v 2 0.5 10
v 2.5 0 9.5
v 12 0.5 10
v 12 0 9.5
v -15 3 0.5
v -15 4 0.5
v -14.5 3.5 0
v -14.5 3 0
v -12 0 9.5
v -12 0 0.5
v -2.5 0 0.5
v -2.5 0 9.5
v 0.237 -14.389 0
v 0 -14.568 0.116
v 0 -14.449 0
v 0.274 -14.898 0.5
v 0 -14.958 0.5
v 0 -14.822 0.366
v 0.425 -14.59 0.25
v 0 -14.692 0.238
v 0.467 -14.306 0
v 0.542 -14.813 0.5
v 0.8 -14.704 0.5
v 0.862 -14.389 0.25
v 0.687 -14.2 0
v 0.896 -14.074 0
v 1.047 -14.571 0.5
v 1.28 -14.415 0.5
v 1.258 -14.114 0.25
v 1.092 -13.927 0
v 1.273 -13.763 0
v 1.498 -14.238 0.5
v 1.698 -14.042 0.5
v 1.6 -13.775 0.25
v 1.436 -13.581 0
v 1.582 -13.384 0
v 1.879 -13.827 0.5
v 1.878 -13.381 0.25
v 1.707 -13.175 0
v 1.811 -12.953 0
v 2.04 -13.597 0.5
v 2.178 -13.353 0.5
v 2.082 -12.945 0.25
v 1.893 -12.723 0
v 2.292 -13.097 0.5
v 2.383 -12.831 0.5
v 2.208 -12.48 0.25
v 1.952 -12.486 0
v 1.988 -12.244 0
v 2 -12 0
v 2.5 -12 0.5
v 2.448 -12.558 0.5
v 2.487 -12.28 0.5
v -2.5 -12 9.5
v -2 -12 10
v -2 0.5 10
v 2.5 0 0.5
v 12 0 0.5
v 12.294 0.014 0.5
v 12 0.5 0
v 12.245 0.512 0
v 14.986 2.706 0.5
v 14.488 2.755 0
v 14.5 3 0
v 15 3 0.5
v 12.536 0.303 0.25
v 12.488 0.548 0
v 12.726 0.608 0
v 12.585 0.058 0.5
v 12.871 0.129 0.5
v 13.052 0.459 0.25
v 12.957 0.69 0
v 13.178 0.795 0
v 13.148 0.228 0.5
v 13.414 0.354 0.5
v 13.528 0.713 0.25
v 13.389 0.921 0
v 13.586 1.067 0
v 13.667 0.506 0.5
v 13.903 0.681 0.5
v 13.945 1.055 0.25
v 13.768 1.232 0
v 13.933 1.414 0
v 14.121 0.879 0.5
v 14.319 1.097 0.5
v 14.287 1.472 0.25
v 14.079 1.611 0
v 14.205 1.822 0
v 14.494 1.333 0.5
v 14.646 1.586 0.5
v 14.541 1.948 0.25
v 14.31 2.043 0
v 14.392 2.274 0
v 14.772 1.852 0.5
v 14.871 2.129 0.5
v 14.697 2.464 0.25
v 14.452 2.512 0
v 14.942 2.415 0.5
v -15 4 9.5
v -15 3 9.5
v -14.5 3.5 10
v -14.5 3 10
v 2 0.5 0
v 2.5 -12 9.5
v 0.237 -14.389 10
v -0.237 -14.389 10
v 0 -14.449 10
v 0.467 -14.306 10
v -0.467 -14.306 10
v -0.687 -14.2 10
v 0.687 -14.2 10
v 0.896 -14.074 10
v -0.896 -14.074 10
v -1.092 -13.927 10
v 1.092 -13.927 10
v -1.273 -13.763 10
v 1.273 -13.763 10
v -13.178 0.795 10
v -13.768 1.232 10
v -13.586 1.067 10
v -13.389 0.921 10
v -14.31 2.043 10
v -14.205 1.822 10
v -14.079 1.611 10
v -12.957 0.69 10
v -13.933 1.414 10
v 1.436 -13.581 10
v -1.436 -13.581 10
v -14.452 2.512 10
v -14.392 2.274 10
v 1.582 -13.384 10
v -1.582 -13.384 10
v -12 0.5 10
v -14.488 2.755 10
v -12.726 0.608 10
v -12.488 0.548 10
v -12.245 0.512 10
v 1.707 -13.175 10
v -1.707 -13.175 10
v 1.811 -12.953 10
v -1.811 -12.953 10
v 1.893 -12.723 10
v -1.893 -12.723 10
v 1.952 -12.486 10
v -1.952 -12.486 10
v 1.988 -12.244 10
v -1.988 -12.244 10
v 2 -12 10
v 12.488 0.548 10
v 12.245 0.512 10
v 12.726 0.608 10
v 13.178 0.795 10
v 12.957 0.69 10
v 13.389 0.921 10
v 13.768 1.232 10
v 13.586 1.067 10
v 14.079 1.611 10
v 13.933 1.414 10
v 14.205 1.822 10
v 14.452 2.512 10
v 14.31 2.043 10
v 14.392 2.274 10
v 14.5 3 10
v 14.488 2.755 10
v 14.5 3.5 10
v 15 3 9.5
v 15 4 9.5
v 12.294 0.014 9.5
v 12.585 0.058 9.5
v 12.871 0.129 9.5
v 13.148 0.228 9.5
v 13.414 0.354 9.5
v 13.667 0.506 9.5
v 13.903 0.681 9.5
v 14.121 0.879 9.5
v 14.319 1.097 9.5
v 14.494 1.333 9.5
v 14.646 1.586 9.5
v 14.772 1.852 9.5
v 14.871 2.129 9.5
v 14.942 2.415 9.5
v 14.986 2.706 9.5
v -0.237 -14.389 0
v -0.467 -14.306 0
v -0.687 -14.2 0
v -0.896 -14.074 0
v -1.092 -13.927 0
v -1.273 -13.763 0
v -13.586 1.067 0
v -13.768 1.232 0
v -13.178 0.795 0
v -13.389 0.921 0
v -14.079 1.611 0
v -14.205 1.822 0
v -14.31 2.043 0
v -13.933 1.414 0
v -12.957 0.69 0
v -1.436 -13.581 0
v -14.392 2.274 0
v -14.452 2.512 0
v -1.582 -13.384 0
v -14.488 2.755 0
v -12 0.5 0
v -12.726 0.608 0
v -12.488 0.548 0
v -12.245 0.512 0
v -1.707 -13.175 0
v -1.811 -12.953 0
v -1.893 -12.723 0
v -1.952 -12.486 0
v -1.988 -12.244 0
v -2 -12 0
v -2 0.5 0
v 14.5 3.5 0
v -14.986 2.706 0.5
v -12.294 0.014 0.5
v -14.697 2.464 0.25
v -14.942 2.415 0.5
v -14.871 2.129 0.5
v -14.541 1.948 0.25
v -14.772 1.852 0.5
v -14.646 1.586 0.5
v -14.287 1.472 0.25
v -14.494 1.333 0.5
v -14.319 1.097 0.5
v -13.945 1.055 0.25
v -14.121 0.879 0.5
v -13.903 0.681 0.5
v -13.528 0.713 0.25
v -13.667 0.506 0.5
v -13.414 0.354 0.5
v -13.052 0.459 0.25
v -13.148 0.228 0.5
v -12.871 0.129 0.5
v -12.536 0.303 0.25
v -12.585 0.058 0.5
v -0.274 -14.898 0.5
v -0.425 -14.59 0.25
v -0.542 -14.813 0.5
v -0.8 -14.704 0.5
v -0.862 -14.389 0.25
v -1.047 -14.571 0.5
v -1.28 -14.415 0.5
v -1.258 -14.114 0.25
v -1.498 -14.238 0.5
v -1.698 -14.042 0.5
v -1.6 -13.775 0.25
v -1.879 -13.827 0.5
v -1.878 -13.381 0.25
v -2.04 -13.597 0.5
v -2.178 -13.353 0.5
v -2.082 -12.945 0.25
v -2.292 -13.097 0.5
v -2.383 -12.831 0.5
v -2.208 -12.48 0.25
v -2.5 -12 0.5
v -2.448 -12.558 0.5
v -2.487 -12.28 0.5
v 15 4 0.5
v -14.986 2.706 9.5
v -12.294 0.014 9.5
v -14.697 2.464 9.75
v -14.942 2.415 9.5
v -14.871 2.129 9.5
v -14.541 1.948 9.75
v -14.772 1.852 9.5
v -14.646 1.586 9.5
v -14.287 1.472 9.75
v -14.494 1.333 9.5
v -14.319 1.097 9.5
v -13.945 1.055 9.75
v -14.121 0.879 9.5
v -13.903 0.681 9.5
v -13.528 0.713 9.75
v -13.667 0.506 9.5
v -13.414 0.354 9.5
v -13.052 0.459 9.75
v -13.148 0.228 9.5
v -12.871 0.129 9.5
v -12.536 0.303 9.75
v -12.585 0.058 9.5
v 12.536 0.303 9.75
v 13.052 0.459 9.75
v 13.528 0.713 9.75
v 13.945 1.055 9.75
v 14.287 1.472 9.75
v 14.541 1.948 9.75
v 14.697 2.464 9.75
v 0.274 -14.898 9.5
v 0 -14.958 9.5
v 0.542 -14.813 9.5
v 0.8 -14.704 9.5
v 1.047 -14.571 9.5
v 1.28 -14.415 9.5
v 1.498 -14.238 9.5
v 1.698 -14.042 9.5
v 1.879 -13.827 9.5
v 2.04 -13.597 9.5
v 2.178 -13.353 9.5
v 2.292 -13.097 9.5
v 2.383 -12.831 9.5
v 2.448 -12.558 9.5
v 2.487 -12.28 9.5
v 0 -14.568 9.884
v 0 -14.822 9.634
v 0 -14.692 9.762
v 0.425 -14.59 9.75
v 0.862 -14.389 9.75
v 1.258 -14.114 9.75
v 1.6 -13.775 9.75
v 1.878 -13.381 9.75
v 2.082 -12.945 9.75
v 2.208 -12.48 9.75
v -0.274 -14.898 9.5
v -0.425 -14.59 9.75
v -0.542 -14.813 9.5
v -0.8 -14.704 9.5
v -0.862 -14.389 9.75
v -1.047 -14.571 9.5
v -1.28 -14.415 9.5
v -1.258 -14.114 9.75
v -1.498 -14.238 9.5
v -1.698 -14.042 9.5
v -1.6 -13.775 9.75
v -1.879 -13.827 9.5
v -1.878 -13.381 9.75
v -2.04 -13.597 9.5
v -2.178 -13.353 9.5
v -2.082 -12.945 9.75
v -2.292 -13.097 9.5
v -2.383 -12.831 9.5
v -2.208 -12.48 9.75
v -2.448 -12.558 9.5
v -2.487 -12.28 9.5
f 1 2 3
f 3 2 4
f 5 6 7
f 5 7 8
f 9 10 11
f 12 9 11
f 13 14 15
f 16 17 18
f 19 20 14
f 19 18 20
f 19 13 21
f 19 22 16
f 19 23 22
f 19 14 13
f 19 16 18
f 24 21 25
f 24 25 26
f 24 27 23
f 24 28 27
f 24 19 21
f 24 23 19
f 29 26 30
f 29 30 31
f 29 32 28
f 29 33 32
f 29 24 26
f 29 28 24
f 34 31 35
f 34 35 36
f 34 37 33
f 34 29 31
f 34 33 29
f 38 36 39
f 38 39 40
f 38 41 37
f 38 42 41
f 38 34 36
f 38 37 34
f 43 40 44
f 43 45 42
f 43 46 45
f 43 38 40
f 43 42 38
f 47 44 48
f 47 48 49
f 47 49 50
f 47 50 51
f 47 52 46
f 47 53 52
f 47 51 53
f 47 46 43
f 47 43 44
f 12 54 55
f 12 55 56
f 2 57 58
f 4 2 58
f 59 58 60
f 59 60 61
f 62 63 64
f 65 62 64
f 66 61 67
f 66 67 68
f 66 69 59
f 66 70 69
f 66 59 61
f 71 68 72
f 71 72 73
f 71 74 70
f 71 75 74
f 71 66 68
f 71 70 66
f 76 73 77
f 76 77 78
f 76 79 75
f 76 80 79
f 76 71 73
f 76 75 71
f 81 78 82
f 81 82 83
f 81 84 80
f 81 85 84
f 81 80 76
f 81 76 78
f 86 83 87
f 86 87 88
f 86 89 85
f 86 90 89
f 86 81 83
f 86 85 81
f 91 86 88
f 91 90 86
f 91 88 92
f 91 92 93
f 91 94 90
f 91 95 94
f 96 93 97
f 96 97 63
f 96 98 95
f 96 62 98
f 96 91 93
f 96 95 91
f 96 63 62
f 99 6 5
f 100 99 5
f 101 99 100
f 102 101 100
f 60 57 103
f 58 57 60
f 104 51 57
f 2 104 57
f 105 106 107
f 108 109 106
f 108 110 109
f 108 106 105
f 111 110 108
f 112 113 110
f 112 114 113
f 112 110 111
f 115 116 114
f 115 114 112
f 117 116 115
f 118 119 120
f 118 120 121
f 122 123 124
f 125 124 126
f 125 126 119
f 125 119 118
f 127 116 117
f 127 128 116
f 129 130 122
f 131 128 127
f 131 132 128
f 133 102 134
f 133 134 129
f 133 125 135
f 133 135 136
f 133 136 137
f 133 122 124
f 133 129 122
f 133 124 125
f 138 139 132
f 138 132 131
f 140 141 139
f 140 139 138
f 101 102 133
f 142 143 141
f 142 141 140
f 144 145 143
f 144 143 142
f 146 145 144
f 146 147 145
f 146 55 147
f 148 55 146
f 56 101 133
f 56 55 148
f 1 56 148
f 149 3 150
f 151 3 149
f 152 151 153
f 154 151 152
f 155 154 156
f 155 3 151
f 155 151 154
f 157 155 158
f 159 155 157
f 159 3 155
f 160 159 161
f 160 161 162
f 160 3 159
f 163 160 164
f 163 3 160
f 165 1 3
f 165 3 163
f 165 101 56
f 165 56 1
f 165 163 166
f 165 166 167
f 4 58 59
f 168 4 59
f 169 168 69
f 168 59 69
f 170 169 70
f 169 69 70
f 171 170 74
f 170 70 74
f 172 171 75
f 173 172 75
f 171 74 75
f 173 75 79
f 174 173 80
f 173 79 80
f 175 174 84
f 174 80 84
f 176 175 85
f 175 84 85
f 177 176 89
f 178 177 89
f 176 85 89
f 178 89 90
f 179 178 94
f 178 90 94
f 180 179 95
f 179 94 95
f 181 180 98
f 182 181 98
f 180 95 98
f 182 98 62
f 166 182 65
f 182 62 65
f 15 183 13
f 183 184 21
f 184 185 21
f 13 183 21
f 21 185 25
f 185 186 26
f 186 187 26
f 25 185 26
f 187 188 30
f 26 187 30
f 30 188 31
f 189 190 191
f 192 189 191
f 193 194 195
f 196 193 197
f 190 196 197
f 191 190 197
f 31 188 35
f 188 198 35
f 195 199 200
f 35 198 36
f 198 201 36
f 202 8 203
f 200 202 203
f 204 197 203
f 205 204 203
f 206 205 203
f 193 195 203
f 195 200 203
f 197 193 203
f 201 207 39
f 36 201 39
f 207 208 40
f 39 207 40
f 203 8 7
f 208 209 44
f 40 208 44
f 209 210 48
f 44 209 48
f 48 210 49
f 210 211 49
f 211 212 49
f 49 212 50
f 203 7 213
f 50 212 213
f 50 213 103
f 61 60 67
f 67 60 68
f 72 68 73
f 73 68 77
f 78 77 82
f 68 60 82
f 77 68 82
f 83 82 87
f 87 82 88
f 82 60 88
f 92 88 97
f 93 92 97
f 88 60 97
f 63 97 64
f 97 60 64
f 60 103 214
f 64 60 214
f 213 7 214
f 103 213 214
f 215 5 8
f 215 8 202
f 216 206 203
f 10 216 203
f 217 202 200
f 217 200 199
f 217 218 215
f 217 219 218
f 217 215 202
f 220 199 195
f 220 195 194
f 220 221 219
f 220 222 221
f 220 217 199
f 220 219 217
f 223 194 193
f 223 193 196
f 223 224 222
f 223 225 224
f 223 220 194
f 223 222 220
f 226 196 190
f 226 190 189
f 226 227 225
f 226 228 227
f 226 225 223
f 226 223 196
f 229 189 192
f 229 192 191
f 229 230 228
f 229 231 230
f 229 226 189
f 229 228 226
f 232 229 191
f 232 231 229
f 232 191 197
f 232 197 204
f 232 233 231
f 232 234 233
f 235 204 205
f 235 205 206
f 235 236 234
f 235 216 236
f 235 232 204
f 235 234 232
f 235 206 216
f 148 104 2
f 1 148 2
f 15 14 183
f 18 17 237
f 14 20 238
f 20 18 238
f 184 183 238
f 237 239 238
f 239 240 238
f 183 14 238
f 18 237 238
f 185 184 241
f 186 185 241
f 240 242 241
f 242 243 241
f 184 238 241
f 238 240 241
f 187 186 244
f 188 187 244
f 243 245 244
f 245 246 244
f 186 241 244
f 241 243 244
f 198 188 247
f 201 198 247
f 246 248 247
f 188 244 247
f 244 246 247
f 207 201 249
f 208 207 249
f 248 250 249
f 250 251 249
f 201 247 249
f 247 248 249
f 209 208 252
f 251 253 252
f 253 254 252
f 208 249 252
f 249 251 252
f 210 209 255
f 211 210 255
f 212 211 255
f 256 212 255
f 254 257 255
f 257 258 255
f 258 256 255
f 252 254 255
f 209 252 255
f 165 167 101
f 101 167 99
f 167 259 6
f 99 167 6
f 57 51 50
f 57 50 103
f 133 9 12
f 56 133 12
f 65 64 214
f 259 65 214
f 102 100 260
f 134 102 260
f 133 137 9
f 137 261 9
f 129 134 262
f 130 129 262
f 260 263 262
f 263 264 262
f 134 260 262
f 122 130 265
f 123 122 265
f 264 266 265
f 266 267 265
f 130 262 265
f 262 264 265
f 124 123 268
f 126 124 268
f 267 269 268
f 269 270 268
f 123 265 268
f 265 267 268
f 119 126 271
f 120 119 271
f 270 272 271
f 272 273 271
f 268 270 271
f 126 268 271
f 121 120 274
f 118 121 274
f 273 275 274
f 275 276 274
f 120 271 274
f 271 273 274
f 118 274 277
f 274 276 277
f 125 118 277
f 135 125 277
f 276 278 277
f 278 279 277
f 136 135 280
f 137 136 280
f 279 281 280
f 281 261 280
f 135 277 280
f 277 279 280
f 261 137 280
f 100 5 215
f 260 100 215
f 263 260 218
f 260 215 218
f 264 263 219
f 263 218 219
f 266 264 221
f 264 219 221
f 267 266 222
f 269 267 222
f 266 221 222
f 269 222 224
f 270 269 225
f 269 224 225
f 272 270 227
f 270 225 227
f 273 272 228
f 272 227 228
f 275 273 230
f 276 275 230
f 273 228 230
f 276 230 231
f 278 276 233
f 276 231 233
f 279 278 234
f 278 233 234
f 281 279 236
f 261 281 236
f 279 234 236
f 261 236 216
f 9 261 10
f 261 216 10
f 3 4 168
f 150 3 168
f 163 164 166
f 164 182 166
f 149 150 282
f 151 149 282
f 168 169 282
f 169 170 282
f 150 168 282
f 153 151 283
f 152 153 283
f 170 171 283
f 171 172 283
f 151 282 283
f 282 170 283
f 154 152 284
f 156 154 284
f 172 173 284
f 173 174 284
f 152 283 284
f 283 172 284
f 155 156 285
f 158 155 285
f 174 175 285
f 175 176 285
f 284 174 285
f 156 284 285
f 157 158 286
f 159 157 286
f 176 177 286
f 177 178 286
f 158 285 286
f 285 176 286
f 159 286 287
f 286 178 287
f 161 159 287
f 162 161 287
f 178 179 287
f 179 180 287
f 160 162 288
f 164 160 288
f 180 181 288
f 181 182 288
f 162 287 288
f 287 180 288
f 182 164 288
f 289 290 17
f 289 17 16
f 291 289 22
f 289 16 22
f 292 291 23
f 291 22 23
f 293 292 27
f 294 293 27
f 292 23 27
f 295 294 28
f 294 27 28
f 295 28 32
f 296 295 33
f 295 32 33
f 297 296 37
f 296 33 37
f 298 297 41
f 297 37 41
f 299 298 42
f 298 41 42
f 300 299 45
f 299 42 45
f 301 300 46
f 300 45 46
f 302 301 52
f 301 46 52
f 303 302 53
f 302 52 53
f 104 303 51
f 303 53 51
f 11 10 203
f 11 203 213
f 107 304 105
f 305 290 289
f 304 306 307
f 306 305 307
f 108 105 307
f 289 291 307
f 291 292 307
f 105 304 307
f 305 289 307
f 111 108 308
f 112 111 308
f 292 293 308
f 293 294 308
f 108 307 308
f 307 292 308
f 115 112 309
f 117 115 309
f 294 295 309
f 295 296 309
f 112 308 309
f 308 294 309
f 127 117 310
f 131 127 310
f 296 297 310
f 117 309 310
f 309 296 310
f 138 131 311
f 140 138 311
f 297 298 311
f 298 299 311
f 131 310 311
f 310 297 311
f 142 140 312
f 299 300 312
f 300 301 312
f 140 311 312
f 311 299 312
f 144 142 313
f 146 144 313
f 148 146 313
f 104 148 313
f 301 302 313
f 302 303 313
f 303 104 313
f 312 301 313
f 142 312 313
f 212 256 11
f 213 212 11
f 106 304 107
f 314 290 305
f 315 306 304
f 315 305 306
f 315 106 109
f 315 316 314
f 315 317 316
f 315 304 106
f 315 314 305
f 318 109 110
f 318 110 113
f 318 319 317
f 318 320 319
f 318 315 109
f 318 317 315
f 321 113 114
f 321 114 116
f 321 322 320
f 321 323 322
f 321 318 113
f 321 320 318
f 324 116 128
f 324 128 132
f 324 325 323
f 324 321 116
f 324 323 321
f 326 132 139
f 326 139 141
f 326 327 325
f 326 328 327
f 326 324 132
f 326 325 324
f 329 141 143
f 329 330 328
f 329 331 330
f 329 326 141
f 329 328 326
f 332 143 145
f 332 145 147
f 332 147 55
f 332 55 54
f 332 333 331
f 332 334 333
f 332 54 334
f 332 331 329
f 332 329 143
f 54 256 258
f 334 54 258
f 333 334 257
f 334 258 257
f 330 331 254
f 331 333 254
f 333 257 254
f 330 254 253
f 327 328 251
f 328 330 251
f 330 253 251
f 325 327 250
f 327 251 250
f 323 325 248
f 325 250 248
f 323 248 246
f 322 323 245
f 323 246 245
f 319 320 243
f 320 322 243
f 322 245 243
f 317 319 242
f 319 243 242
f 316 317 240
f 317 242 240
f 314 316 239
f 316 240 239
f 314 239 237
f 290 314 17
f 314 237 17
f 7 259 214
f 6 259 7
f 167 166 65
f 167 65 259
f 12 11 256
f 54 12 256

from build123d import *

# Parameters (mm, degrees)
F1_DEPTH    = 10
F2_T1_DEPTH = 25
F3_SIZE     = 0.5


# Not quite as in the source:
# - a fillet or chamfer that OpenCascade refuses, or shapes differently, is made with other operations: its cross-section is extruded or revolved along the edge and cut away or added


with BuildPart() as f1:
    # F0 (on Top) → F1 (new body)
    with BuildSketch(Plane.XY):
        Polygon((-15, 4), (-15, 0), (-2.5, 0), (-2.5, -15), (2.5, -15), (2.5, 0), (15, 0), (15, 4), align=None)
    extrude(amount=F1_DEPTH)

    # F2: fillet of radius 3 on 4 edges, made by hand

    # F2_s2 → F2_t1 (cut)
    with BuildSketch(Plane.XY.offset(-7.5)):
        with BuildLine():
            ThreePointArc((-2.5, -12), (-1.6213203436, -14.1213203436), (0.5, -15))
            Line((0.5, -15), (-2.5, -15))
            Line((-2.5, -15), (-2.5, -12))
        make_face()
        with BuildLine():
            ThreePointArc((-0.5, -15), (1.6213203436, -14.1213203436), (2.5, -12))
            Line((2.5, -12), (2.5, -15))
            Line((2.5, -15), (-0.5, -15))
        make_face()
        with BuildLine():
            ThreePointArc((-15, 3), (-14.1213203436, 0.8786796564), (-12, 0))
            Line((-12, 0), (-15, 0))
            Line((-15, 0), (-15, 3))
        make_face()
        with BuildLine():
            ThreePointArc((12, 0), (14.1213203436, 0.8786796564), (15, 3))
            Line((15, 3), (15, 0))
            Line((15, 0), (12, 0))
        make_face()
    extrude(amount=F2_T1_DEPTH, mode=Mode.SUBTRACT)

    # F3
    f3_edges = [f1.edges().sort_by_distance(p)[0] for p in [
        (0, 4, 10),
        (15, 3.5, 10),
        (14.12132, 0.87868, 10),
        (7.25, 0, 10),
        (2.5, -6, 10),
        (1.791288, -13.936492, 10),
        (-1.791288, -13.936492, 10),
        (-2.5, -6, 10),
        (-7.25, 0, 10),
        (-14.12132, 0.87868, 10),
        (-15, 3.5, 10),
        (0, 4, 0),
        (15, 3.5, 0),
        (14.12132, 0.87868, 0),
        (7.25, 0, 0),
        (2.5, -6, 0),
        (1.791288, -13.936492, 0),
        (-1.791288, -13.936492, 0),
        (-2.5, -6, 0),
        (-7.25, 0, 0),
        (-14.12132, 0.87868, 0),
        (-15, 3.5, 0),
    ]]
    chamfer(f3_edges, length=F3_SIZE)


solid = f1.part
